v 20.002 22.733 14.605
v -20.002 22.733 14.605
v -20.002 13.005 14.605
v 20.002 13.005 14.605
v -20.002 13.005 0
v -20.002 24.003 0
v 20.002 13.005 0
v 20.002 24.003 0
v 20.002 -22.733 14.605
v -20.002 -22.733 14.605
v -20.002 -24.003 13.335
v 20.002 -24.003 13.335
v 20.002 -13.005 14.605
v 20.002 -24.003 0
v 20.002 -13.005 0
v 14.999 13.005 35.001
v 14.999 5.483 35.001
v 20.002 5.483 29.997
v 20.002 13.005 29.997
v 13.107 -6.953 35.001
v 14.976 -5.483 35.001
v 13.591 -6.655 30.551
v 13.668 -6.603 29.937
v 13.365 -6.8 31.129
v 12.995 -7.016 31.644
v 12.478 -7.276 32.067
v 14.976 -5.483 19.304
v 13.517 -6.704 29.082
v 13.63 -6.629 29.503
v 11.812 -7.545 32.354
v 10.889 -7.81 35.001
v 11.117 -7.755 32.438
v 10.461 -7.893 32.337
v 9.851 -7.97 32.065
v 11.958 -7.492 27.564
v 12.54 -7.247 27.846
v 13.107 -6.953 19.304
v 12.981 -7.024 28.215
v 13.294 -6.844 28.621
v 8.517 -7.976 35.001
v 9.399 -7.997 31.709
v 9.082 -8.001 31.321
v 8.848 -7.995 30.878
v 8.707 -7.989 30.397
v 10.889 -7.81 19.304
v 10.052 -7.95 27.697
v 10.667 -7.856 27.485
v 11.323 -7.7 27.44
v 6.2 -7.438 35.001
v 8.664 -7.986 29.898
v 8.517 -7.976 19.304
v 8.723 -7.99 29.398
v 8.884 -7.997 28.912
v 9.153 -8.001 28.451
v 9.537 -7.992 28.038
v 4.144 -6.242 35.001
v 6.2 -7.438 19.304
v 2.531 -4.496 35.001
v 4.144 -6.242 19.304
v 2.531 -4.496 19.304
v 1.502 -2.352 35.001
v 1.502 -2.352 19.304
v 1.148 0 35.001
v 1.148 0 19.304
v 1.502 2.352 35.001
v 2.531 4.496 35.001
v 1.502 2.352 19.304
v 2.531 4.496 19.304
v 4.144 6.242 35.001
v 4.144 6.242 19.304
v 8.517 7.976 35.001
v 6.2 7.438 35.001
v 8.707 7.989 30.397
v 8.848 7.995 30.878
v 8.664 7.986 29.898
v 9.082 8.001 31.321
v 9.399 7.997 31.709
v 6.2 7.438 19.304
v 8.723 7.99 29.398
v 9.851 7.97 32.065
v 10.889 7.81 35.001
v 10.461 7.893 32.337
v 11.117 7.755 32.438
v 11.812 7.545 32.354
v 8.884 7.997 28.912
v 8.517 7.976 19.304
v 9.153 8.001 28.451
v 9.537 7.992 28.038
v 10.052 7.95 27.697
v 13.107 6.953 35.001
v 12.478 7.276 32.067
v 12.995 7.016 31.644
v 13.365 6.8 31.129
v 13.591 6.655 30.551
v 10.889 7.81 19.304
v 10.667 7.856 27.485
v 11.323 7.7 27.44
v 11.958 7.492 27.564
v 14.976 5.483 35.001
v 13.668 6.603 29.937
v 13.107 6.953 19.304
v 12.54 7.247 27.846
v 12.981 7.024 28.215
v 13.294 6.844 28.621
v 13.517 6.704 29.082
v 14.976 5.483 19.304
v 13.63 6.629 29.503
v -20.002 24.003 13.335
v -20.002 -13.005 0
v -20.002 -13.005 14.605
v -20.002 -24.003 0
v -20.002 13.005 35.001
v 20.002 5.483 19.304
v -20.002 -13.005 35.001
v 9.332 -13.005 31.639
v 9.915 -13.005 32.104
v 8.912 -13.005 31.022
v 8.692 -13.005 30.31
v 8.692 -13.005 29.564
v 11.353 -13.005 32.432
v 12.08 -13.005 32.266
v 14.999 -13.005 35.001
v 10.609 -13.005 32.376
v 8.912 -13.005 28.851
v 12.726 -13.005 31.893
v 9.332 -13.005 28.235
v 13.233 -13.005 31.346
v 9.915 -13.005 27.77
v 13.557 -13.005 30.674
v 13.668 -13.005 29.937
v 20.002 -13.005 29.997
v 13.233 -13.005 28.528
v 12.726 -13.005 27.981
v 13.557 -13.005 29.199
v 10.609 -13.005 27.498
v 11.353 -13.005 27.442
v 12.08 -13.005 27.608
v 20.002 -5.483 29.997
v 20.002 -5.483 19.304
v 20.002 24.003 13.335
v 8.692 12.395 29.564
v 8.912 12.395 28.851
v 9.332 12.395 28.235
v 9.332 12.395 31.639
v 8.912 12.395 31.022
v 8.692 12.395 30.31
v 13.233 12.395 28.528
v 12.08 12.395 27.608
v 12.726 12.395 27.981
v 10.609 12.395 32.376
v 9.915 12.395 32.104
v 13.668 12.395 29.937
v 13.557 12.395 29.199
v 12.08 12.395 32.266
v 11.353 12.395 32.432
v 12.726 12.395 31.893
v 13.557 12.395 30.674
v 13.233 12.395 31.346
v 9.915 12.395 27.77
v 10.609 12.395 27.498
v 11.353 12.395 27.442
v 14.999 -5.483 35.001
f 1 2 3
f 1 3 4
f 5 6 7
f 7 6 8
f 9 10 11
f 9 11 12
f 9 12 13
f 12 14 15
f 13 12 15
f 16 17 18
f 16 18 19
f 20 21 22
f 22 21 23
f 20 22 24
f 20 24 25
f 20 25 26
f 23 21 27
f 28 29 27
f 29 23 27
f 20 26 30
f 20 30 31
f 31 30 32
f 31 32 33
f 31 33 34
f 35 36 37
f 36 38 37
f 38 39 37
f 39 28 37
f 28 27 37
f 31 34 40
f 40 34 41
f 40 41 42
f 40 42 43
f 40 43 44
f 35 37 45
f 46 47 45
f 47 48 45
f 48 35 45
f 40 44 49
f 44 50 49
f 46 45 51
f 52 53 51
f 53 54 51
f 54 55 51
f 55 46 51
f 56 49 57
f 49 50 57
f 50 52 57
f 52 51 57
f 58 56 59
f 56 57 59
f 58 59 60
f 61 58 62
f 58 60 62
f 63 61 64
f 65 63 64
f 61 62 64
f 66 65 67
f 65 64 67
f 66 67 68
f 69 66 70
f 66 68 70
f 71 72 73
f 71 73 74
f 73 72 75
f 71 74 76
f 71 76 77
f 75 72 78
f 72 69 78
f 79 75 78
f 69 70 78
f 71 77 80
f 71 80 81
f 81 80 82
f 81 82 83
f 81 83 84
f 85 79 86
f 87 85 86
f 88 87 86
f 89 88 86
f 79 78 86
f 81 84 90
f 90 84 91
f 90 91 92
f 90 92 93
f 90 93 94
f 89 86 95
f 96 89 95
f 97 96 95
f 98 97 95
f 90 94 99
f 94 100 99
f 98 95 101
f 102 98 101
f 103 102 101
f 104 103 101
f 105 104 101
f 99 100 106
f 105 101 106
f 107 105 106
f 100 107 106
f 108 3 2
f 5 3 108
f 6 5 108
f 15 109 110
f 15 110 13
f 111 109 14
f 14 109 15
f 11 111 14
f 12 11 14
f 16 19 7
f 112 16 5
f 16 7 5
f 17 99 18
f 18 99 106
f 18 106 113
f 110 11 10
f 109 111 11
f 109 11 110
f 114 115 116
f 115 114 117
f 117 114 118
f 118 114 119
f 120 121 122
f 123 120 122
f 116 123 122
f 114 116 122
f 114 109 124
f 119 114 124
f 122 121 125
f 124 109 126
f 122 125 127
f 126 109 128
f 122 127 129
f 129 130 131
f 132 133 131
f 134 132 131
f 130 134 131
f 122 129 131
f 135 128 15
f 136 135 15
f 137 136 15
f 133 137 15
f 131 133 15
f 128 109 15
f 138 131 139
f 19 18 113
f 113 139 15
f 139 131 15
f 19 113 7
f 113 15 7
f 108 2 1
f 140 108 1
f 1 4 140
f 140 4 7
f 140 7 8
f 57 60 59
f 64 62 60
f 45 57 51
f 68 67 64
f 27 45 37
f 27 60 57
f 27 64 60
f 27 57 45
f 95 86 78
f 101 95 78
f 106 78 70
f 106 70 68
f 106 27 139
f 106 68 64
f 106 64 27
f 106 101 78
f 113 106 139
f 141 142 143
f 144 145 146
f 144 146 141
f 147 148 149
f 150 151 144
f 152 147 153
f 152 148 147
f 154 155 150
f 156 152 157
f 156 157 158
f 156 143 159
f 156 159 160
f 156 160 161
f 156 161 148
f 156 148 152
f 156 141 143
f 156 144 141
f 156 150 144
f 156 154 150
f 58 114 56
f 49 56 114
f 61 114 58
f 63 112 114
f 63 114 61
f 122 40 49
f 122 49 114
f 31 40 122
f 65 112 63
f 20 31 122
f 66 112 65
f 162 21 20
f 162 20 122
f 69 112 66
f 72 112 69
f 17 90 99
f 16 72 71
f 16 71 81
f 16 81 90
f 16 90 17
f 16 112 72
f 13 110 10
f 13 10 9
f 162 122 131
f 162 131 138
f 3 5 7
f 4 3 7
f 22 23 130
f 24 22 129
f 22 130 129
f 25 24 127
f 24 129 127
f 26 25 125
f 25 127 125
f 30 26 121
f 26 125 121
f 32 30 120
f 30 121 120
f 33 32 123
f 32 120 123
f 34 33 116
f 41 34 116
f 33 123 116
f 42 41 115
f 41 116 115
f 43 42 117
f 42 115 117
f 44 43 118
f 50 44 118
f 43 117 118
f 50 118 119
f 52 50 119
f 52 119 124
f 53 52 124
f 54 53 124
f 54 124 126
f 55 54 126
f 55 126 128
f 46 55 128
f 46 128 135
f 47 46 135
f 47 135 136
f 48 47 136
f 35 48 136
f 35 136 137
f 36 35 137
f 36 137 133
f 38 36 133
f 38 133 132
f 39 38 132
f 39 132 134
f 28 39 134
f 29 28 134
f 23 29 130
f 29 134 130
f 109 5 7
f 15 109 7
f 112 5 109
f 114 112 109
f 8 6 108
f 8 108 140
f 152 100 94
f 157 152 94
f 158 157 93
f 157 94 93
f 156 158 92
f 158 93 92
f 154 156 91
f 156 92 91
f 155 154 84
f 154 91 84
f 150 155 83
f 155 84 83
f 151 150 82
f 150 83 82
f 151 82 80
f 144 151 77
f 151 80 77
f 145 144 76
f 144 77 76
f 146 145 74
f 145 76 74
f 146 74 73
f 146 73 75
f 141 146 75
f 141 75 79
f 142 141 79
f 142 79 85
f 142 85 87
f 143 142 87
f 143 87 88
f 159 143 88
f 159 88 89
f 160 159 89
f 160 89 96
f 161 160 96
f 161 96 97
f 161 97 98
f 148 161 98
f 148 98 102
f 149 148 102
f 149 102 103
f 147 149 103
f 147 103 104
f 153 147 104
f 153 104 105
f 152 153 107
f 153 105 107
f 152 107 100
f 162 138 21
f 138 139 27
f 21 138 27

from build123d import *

# Parameters (mm, degrees)
F0_W      = 40.005
F0_H      = 10.9982
F1_DEPTH  = 14.605
F2_DEPTH  = 35.0012
F3_DEPTH  = 19.304
F4_SIZE   = 5.0038
F5_R      = 2.5019
F6_DEPTH  = 25.4
F7_SIZE   = 1.27
F7_2_SIZE = 1.27


with BuildPart() as f1:
    # F0 (on Top) → F1 (new body)
    with BuildSketch(Plane.XY):
        with Locations((0, -18.5039)):
            Rectangle(F0_W, F0_H)
    extrude(amount=F1_DEPTH)

    # F7#2
    f7_2_edges = [f1.edges().sort_by_distance(p)[0] for p in [
        (0, -24.003, 14.605),
    ]]
    chamfer(f7_2_edges, length=F7_2_SIZE)


with BuildPart() as f1b:
    # F0 (on Top) → F1, piece 2 (new body)
    with BuildSketch(Plane.XY):
        with Locations((0, 18.5039)):
            Rectangle(F0_W, F0_H)
    extrude(amount=F1_DEPTH)

    # F7
    f7_edges = [f1b.edges().sort_by_distance(p)[0] for p in [
        (0, 24.003, 14.605),
    ]]
    chamfer(f7_edges, length=F7_SIZE)


with BuildPart() as f2:
    # F0 (on Top) → F2 (new body)
    with BuildSketch(Plane.XY):
        with BuildLine():
            Line((-20.0025, -13.0048), (20.0025, -13.0048))
            Line((20.0025, -13.0048), (20.0025, -5.4828948))
            Line((20.0025, -5.4828948), (14.9763364049, -5.4828948))
            ThreePointArc((14.9763364049, -5.4828948), (1.148341844, 0), (14.9763364049, 5.4828948))
            Line((14.9763364049, 5.4828948), (20.0025, 5.4828948))
            Line((20.0025, 5.4828948), (20.0025, 13.0048))
            Line((20.0025, 13.0048), (-20.0025, 13.0048))
            Line((-20.0025, 13.0048), (-20.0025, -13.0048))
        make_face()
    extrude(amount=F2_DEPTH)

    # F0 (on Top) → F3 (join)
    with BuildSketch(Plane.XY):
        with BuildLine():
            ThreePointArc((14.9763364049, 5.4828948), (1.148341844, 0), (14.9763364049, -5.4828948))
            ThreePointArc((14.9763364049, -5.4828948), (16.5870089676, -2.9490860888), (17.150341844, 0))
            ThreePointArc((17.150341844, 0), (16.5870089676, 2.9490860888), (14.9763364049, 5.4828948))
        make_face()
        with BuildLine():
            Line((14.9763364049, -5.4828948), (20.0025, -5.4828948))
            Line((20.0025, -5.4828948), (20.0025, 5.4828948))
            Line((20.0025, 5.4828948), (14.9763364049, 5.4828948))
            ThreePointArc((14.9763364049, 5.4828948), (16.5870089676, 2.9490860888), (17.150341844, 0))
            ThreePointArc((17.150341844, 0), (16.5870089676, -2.9490860888), (14.9763364049, -5.4828948))
        make_face()
    extrude(amount=F3_DEPTH)

    # F4
    f4_edges = [f2.edges().sort_by_distance(p)[0] for p in [
        (20.0025, -9.243847, 35.0012),
        (20.0025, 9.243847, 35.0012),
    ]]
    chamfer(f4_edges, length=F4_SIZE)

    # F5 (on face) → F6 (cut)
    with BuildSketch(Plane.XZ.offset(13.0048)):
        with Locations((11.1658386886, 29.93693389)):
            Circle(F5_R)
    extrude(amount=-F6_DEPTH, mode=Mode.SUBTRACT)


solid = Compound([f1.part, f1b.part, f2.part])
